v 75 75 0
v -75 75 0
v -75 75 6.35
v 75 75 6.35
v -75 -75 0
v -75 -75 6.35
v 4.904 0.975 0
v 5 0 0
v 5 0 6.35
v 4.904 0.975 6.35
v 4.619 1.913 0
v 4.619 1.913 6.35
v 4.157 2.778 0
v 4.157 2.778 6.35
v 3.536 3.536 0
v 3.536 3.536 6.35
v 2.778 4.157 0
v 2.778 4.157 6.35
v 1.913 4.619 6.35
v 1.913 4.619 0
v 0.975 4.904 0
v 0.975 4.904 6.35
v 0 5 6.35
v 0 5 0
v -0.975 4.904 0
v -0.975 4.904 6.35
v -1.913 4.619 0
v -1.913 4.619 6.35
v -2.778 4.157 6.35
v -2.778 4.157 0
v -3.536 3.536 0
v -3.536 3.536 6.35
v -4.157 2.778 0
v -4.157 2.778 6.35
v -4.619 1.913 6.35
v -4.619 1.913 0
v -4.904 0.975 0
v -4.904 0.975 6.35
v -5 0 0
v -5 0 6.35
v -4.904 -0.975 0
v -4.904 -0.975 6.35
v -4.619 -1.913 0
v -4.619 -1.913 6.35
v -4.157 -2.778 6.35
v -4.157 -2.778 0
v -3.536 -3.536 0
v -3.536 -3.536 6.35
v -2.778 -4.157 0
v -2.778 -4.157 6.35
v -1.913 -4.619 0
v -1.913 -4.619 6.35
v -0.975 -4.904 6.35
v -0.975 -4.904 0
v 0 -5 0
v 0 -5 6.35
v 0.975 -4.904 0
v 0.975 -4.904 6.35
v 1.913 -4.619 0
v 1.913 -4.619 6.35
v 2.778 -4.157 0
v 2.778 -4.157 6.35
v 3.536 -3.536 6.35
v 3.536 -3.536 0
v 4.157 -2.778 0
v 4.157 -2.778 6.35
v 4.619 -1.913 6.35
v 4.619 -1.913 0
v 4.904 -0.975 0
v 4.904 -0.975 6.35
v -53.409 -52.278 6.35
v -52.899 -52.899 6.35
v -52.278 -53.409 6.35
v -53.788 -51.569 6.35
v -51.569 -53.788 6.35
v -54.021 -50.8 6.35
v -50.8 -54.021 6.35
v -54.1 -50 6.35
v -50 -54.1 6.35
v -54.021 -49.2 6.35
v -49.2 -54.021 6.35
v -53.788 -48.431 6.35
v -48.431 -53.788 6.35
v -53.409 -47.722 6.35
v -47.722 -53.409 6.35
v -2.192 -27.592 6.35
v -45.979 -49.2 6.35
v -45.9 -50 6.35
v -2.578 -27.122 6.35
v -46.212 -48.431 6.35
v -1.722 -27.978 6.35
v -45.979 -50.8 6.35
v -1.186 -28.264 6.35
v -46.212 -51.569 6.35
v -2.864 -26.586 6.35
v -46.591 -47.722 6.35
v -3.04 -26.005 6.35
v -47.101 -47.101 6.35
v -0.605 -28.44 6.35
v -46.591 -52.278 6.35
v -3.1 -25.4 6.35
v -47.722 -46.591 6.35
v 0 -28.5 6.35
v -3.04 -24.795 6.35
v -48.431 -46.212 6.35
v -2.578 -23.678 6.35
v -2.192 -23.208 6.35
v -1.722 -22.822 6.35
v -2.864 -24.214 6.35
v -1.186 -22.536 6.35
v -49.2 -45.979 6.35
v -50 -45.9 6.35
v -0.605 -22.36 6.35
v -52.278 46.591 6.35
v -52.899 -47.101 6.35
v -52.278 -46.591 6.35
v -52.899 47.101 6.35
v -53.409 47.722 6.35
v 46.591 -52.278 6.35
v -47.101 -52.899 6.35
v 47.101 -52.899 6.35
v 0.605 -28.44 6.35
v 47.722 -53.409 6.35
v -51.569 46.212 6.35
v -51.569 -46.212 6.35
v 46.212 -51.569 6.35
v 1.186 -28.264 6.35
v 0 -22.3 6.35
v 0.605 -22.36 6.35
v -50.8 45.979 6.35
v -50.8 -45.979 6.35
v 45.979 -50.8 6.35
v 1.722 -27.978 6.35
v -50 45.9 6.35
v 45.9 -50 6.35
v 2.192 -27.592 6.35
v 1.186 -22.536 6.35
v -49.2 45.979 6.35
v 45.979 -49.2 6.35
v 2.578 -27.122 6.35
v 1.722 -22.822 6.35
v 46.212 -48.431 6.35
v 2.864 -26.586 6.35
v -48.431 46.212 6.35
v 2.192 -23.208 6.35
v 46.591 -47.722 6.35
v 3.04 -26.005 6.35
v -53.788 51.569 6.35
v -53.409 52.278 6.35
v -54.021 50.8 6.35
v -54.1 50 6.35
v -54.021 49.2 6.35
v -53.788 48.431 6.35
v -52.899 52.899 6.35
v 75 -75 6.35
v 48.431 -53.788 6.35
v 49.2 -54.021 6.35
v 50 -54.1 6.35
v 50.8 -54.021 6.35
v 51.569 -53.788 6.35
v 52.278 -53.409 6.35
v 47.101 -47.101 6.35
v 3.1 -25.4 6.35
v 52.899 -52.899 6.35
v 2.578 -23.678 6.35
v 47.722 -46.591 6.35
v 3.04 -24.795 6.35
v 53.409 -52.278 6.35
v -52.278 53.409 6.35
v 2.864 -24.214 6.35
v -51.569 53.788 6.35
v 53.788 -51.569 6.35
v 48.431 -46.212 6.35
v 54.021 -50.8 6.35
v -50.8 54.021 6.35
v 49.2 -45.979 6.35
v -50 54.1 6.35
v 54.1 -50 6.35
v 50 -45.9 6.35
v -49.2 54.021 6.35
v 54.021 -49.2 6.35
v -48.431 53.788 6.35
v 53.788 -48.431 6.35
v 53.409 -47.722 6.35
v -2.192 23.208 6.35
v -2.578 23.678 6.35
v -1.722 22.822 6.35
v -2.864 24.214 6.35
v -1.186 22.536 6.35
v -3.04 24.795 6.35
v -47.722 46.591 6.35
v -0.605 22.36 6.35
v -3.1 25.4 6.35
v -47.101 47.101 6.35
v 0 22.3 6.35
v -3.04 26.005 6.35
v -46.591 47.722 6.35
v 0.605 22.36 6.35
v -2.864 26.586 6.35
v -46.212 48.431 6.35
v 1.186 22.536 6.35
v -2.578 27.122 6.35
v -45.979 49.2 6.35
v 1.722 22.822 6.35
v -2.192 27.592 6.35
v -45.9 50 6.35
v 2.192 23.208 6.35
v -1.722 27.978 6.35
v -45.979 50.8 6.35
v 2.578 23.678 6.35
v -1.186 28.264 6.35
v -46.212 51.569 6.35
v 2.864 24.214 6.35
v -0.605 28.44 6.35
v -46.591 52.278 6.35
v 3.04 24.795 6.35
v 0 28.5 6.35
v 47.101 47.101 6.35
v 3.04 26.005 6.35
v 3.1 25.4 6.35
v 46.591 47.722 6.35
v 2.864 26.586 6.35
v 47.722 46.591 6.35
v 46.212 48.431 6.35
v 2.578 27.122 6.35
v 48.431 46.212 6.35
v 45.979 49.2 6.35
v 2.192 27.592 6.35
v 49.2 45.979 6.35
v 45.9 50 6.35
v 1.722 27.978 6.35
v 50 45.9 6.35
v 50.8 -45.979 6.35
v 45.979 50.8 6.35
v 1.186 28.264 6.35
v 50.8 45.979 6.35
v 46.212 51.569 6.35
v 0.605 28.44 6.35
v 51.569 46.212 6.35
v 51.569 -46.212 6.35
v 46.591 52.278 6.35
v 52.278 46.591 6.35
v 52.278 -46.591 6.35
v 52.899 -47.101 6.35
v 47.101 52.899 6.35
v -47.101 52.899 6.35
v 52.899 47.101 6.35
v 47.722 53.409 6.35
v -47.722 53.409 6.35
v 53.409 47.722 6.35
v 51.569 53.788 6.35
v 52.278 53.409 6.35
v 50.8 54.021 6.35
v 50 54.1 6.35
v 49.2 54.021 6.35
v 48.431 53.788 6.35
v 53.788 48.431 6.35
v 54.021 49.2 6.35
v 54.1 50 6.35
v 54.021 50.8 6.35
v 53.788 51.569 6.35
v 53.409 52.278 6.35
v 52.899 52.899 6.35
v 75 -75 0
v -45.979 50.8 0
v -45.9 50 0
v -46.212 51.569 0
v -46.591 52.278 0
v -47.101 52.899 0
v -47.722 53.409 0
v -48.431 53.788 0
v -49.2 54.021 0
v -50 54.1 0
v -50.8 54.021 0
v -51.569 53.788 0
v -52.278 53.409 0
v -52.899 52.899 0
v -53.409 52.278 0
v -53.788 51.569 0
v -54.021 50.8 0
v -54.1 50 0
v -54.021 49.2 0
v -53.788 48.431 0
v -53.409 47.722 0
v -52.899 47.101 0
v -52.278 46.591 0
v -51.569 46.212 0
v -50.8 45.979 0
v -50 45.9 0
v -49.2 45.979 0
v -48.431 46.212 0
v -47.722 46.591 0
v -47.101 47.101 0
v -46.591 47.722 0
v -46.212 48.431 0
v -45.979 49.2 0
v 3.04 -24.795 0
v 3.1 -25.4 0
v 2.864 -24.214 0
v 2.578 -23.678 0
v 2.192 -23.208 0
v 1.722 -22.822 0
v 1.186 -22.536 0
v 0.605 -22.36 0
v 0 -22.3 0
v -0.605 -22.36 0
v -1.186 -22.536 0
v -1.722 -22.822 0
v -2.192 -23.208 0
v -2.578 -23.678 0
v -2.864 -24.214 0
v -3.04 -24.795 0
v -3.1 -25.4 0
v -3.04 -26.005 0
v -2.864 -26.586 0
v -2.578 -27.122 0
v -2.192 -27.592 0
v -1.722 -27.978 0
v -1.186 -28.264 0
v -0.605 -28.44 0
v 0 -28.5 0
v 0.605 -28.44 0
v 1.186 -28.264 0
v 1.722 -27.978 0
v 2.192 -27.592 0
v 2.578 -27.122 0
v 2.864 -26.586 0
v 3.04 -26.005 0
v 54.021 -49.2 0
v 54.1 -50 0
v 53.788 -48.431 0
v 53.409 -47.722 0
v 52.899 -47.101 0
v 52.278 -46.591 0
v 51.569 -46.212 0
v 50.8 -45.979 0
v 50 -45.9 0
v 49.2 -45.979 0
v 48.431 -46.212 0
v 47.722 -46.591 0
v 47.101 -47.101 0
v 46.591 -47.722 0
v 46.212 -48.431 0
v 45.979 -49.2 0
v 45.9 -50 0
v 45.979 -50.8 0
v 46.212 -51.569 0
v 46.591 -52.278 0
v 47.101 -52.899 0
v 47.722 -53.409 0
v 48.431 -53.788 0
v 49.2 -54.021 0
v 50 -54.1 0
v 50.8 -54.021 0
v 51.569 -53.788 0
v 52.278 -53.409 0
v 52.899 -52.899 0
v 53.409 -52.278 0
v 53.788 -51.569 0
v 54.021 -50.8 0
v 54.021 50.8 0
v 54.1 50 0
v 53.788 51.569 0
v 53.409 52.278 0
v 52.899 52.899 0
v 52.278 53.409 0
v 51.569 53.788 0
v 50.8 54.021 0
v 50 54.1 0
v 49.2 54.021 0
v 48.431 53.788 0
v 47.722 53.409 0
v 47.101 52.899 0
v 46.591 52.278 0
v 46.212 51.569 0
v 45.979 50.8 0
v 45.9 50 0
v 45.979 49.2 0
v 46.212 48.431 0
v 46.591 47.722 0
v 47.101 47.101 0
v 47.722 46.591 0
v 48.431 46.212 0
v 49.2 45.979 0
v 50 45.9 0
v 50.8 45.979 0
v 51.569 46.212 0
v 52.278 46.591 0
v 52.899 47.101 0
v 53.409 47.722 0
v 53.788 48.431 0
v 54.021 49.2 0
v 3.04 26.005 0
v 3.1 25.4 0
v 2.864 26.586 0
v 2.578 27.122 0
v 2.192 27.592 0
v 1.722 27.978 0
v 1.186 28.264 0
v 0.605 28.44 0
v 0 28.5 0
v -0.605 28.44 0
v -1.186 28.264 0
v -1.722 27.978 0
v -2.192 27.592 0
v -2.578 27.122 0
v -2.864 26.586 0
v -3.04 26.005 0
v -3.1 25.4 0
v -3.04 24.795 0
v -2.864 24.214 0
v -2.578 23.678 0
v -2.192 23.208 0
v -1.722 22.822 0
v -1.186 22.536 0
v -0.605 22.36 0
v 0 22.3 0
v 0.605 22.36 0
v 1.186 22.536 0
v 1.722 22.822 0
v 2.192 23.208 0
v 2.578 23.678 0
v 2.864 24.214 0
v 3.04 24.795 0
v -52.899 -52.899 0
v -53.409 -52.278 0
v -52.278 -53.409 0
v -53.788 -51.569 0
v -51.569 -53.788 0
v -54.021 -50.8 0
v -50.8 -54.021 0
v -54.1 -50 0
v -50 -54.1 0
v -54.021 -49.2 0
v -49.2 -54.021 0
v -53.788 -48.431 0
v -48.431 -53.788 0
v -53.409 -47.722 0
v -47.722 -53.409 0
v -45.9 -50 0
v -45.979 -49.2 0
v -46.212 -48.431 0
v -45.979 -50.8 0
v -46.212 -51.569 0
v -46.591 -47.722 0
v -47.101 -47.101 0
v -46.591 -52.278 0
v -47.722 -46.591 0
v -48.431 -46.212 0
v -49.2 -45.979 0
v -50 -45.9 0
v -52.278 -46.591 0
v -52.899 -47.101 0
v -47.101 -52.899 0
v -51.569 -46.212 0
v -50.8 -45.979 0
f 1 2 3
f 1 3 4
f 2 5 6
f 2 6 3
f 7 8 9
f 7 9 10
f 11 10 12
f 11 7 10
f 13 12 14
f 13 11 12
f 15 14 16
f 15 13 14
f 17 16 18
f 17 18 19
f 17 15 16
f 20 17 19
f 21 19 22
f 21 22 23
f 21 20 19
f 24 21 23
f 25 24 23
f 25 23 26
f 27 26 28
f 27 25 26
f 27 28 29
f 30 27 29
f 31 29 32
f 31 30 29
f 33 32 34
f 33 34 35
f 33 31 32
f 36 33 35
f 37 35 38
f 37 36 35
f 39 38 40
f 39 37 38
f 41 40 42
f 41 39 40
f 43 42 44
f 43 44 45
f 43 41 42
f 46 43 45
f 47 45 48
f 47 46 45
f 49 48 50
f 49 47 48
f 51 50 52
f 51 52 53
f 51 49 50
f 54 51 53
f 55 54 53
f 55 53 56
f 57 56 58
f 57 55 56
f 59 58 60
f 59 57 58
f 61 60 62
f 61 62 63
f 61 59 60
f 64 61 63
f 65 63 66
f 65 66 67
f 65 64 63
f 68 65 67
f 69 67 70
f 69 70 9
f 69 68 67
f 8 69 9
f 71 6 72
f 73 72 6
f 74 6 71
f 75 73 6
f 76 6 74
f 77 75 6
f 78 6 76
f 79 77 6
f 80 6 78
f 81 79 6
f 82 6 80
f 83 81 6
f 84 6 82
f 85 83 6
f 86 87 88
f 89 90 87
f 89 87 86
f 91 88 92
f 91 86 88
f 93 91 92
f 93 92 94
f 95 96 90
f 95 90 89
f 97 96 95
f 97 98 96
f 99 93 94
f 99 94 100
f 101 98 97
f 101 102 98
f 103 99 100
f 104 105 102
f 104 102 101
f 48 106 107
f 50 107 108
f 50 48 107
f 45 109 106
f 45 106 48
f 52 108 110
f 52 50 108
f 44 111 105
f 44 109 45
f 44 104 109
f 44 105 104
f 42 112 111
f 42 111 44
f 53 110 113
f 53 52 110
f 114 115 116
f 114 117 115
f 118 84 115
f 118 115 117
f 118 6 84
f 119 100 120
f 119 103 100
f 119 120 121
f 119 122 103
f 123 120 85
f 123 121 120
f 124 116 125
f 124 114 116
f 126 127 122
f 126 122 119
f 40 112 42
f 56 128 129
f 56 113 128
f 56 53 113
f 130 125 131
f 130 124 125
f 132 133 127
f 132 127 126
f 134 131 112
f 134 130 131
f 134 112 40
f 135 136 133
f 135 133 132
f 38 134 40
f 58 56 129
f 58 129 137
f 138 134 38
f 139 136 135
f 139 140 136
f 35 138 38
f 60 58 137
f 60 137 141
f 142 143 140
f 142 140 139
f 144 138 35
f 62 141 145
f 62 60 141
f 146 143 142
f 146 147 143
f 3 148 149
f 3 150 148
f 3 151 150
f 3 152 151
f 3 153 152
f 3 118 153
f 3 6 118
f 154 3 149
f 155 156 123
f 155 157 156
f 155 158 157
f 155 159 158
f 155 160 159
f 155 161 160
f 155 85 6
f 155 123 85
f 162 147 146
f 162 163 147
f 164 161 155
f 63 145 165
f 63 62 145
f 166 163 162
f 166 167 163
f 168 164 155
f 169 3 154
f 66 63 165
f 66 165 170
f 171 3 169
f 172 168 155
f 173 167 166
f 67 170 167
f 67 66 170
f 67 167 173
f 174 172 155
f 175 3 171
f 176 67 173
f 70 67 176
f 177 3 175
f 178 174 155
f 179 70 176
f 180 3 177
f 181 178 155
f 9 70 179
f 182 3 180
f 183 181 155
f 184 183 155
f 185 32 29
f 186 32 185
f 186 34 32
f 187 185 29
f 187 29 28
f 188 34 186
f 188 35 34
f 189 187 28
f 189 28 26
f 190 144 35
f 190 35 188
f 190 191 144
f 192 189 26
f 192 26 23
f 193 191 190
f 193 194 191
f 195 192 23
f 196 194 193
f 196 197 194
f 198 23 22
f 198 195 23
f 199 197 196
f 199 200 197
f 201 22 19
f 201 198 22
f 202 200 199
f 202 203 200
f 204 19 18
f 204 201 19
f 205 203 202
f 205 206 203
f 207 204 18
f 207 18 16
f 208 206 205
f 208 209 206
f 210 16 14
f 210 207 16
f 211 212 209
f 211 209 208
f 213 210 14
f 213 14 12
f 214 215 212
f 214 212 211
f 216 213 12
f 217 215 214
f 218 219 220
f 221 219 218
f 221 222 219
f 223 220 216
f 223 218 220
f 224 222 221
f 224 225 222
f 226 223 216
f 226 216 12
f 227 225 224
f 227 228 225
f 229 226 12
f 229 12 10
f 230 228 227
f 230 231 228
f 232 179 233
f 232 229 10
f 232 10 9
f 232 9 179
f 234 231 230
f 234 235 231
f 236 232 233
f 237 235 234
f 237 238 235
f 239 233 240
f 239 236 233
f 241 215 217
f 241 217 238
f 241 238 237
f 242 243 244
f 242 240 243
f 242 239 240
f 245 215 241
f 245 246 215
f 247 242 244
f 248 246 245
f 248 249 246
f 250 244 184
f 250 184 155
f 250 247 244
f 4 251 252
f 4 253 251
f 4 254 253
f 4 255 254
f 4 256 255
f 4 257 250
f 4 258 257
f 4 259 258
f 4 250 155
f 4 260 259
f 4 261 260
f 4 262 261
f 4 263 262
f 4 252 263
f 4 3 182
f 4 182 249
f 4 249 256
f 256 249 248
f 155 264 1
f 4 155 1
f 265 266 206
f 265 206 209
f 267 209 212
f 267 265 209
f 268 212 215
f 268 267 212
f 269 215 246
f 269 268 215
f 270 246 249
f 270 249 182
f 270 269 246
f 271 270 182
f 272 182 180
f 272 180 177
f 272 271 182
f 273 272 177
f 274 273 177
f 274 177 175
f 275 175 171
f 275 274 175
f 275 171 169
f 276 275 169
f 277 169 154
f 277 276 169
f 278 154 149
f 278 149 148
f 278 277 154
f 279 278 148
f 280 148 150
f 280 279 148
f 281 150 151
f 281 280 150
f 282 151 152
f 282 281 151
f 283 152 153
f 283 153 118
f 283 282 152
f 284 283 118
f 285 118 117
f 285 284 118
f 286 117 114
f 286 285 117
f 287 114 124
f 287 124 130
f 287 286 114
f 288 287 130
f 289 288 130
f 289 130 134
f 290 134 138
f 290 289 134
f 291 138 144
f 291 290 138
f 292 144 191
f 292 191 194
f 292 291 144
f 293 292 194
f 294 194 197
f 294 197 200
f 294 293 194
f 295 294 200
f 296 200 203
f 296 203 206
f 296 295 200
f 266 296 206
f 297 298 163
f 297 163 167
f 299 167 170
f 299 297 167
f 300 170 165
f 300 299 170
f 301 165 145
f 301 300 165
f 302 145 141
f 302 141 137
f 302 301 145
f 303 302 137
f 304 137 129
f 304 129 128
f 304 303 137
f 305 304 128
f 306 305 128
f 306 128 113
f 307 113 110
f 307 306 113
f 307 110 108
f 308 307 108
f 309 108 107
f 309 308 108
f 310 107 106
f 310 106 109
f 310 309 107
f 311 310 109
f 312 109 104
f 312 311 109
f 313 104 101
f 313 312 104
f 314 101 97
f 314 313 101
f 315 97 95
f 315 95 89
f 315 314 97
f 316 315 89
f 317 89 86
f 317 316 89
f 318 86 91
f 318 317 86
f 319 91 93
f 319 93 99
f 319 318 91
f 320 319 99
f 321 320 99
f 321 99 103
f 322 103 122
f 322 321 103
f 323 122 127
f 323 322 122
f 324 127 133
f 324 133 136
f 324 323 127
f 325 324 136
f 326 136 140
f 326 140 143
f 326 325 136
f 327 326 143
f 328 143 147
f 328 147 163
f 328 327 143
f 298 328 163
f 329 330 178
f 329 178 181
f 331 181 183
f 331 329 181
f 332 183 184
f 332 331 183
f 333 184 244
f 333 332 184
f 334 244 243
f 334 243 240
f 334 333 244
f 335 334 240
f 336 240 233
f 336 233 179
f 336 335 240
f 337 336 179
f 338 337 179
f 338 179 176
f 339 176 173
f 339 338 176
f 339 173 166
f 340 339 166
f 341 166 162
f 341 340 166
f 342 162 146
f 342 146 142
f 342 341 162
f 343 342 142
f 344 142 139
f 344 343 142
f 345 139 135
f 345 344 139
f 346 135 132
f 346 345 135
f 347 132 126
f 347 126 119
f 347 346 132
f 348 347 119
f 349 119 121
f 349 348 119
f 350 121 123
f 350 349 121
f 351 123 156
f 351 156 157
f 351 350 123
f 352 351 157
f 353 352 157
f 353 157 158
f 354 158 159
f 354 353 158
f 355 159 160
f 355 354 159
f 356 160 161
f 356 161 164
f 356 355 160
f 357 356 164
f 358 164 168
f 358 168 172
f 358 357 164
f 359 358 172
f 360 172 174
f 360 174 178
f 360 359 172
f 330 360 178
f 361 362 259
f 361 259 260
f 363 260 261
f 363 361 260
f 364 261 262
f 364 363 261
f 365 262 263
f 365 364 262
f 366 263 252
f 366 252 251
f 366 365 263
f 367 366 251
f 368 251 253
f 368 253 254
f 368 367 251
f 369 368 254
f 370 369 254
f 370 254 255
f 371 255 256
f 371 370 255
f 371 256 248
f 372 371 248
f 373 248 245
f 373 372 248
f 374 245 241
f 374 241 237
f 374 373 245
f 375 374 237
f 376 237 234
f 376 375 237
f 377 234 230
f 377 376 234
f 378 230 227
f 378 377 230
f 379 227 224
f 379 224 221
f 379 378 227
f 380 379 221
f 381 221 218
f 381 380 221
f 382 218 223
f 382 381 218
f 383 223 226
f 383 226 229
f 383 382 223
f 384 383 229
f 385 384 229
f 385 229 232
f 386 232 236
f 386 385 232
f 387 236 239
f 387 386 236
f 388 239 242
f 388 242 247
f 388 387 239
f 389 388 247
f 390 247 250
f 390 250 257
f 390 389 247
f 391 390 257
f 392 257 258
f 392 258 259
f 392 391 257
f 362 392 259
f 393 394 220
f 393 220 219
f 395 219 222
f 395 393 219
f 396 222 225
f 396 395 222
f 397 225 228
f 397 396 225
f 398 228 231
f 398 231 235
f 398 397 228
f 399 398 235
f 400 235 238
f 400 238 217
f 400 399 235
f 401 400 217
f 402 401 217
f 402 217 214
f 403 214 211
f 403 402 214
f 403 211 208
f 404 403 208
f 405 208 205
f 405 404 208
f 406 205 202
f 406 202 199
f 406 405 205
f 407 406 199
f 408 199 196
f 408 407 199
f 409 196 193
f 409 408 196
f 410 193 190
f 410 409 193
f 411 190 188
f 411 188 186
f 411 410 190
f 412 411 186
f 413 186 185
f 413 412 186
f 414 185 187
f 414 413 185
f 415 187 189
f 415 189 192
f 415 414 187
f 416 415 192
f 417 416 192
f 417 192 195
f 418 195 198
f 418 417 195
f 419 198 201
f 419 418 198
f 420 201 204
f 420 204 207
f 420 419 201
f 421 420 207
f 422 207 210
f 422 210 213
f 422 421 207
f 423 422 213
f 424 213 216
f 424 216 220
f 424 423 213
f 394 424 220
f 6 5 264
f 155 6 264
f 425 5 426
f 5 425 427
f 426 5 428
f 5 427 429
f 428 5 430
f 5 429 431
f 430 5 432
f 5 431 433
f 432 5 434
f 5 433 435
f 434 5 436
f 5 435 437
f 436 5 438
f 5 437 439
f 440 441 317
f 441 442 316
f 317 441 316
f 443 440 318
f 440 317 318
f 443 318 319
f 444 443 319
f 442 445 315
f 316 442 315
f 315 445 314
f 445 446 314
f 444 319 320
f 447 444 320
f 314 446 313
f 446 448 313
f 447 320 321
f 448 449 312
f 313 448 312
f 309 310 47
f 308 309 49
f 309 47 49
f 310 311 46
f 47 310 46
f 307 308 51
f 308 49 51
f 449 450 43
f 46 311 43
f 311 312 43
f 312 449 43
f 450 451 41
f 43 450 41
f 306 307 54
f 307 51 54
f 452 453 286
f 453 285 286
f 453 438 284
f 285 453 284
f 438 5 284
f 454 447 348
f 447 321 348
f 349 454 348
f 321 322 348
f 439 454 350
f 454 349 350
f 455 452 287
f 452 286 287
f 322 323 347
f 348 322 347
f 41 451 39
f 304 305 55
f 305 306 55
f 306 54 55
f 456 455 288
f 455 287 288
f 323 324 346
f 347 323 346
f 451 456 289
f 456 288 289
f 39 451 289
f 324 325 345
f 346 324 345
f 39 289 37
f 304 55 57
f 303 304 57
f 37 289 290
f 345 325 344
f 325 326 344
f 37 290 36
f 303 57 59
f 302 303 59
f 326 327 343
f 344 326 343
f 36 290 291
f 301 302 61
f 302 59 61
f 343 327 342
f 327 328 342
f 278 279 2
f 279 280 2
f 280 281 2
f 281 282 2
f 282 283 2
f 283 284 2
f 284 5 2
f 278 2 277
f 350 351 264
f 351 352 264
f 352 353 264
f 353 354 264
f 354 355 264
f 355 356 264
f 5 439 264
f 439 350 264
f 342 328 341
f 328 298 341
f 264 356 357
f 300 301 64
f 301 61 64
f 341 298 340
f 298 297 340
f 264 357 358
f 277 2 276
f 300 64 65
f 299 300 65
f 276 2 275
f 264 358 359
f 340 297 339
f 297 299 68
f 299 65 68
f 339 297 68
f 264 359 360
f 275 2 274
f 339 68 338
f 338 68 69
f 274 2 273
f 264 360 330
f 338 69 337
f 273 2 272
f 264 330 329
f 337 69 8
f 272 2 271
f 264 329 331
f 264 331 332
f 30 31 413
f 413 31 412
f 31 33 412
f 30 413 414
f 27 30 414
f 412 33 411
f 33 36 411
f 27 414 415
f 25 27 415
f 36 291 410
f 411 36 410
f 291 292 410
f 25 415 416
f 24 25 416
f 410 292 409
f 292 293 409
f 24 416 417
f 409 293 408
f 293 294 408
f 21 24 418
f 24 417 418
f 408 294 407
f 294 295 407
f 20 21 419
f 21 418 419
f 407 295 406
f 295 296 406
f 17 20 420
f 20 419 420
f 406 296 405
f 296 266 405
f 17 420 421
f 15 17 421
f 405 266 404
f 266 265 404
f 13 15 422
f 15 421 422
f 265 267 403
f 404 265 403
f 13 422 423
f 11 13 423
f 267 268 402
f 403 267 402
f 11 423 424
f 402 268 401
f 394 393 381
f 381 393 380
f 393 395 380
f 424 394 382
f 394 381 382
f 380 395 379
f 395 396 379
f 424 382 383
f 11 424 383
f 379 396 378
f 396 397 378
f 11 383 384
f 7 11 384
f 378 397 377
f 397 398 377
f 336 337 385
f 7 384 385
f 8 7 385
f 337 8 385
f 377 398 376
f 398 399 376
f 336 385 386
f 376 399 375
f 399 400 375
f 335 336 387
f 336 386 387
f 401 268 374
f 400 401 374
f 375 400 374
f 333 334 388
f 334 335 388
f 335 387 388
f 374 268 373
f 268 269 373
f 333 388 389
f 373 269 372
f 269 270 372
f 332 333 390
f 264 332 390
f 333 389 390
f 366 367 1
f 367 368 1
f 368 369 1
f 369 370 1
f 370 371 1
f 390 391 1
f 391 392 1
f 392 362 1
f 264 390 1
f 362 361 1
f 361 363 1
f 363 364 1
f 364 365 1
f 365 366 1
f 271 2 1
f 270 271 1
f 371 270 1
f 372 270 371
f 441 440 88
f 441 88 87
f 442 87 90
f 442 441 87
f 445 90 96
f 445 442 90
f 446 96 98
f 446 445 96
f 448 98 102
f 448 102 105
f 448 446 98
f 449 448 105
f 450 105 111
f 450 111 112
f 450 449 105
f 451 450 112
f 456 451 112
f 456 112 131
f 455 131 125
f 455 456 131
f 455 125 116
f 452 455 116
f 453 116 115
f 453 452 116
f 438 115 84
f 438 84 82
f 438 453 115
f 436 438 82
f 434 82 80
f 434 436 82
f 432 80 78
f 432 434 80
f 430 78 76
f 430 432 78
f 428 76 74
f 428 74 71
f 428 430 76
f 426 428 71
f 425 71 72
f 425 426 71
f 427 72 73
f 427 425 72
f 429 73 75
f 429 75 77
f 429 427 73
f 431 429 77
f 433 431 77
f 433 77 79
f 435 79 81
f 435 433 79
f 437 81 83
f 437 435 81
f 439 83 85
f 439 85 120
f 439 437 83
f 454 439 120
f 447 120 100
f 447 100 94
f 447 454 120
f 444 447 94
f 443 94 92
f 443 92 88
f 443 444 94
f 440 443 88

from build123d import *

# Parameters (mm, degrees)
CROQUIS1_W              = 150
CROQUIS1_H              = 150
CROQUIS1_R              = 3.1
CROQUIS1_R_2            = 4.1
CROQUIS1_R_3            = 5
SALIENTE_EXTRUIR1_DEPTH = 6.35


with BuildPart() as part:
    # Croquis1 → Saliente-Extruir1 (new body)
    with BuildSketch(Plane.XY):
        Rectangle(CROQUIS1_W, CROQUIS1_H)
        with Locations((0, 25.4)):
            Circle(CROQUIS1_R, mode=Mode.SUBTRACT)
        with Locations((0, -25.4)):
            Circle(CROQUIS1_R, mode=Mode.SUBTRACT)
        with Locations((-50, 50)):
            Circle(CROQUIS1_R_2, mode=Mode.SUBTRACT)
        with Locations((50, 50)):
            Circle(CROQUIS1_R_2, mode=Mode.SUBTRACT)
        with Locations((50, -50)):
            Circle(CROQUIS1_R_2, mode=Mode.SUBTRACT)
        with Locations((-50, -50)):
            Circle(CROQUIS1_R_2, mode=Mode.SUBTRACT)
        Circle(CROQUIS1_R_3, mode=Mode.SUBTRACT)
    extrude(amount=SALIENTE_EXTRUIR1_DEPTH)


solid = part.part
